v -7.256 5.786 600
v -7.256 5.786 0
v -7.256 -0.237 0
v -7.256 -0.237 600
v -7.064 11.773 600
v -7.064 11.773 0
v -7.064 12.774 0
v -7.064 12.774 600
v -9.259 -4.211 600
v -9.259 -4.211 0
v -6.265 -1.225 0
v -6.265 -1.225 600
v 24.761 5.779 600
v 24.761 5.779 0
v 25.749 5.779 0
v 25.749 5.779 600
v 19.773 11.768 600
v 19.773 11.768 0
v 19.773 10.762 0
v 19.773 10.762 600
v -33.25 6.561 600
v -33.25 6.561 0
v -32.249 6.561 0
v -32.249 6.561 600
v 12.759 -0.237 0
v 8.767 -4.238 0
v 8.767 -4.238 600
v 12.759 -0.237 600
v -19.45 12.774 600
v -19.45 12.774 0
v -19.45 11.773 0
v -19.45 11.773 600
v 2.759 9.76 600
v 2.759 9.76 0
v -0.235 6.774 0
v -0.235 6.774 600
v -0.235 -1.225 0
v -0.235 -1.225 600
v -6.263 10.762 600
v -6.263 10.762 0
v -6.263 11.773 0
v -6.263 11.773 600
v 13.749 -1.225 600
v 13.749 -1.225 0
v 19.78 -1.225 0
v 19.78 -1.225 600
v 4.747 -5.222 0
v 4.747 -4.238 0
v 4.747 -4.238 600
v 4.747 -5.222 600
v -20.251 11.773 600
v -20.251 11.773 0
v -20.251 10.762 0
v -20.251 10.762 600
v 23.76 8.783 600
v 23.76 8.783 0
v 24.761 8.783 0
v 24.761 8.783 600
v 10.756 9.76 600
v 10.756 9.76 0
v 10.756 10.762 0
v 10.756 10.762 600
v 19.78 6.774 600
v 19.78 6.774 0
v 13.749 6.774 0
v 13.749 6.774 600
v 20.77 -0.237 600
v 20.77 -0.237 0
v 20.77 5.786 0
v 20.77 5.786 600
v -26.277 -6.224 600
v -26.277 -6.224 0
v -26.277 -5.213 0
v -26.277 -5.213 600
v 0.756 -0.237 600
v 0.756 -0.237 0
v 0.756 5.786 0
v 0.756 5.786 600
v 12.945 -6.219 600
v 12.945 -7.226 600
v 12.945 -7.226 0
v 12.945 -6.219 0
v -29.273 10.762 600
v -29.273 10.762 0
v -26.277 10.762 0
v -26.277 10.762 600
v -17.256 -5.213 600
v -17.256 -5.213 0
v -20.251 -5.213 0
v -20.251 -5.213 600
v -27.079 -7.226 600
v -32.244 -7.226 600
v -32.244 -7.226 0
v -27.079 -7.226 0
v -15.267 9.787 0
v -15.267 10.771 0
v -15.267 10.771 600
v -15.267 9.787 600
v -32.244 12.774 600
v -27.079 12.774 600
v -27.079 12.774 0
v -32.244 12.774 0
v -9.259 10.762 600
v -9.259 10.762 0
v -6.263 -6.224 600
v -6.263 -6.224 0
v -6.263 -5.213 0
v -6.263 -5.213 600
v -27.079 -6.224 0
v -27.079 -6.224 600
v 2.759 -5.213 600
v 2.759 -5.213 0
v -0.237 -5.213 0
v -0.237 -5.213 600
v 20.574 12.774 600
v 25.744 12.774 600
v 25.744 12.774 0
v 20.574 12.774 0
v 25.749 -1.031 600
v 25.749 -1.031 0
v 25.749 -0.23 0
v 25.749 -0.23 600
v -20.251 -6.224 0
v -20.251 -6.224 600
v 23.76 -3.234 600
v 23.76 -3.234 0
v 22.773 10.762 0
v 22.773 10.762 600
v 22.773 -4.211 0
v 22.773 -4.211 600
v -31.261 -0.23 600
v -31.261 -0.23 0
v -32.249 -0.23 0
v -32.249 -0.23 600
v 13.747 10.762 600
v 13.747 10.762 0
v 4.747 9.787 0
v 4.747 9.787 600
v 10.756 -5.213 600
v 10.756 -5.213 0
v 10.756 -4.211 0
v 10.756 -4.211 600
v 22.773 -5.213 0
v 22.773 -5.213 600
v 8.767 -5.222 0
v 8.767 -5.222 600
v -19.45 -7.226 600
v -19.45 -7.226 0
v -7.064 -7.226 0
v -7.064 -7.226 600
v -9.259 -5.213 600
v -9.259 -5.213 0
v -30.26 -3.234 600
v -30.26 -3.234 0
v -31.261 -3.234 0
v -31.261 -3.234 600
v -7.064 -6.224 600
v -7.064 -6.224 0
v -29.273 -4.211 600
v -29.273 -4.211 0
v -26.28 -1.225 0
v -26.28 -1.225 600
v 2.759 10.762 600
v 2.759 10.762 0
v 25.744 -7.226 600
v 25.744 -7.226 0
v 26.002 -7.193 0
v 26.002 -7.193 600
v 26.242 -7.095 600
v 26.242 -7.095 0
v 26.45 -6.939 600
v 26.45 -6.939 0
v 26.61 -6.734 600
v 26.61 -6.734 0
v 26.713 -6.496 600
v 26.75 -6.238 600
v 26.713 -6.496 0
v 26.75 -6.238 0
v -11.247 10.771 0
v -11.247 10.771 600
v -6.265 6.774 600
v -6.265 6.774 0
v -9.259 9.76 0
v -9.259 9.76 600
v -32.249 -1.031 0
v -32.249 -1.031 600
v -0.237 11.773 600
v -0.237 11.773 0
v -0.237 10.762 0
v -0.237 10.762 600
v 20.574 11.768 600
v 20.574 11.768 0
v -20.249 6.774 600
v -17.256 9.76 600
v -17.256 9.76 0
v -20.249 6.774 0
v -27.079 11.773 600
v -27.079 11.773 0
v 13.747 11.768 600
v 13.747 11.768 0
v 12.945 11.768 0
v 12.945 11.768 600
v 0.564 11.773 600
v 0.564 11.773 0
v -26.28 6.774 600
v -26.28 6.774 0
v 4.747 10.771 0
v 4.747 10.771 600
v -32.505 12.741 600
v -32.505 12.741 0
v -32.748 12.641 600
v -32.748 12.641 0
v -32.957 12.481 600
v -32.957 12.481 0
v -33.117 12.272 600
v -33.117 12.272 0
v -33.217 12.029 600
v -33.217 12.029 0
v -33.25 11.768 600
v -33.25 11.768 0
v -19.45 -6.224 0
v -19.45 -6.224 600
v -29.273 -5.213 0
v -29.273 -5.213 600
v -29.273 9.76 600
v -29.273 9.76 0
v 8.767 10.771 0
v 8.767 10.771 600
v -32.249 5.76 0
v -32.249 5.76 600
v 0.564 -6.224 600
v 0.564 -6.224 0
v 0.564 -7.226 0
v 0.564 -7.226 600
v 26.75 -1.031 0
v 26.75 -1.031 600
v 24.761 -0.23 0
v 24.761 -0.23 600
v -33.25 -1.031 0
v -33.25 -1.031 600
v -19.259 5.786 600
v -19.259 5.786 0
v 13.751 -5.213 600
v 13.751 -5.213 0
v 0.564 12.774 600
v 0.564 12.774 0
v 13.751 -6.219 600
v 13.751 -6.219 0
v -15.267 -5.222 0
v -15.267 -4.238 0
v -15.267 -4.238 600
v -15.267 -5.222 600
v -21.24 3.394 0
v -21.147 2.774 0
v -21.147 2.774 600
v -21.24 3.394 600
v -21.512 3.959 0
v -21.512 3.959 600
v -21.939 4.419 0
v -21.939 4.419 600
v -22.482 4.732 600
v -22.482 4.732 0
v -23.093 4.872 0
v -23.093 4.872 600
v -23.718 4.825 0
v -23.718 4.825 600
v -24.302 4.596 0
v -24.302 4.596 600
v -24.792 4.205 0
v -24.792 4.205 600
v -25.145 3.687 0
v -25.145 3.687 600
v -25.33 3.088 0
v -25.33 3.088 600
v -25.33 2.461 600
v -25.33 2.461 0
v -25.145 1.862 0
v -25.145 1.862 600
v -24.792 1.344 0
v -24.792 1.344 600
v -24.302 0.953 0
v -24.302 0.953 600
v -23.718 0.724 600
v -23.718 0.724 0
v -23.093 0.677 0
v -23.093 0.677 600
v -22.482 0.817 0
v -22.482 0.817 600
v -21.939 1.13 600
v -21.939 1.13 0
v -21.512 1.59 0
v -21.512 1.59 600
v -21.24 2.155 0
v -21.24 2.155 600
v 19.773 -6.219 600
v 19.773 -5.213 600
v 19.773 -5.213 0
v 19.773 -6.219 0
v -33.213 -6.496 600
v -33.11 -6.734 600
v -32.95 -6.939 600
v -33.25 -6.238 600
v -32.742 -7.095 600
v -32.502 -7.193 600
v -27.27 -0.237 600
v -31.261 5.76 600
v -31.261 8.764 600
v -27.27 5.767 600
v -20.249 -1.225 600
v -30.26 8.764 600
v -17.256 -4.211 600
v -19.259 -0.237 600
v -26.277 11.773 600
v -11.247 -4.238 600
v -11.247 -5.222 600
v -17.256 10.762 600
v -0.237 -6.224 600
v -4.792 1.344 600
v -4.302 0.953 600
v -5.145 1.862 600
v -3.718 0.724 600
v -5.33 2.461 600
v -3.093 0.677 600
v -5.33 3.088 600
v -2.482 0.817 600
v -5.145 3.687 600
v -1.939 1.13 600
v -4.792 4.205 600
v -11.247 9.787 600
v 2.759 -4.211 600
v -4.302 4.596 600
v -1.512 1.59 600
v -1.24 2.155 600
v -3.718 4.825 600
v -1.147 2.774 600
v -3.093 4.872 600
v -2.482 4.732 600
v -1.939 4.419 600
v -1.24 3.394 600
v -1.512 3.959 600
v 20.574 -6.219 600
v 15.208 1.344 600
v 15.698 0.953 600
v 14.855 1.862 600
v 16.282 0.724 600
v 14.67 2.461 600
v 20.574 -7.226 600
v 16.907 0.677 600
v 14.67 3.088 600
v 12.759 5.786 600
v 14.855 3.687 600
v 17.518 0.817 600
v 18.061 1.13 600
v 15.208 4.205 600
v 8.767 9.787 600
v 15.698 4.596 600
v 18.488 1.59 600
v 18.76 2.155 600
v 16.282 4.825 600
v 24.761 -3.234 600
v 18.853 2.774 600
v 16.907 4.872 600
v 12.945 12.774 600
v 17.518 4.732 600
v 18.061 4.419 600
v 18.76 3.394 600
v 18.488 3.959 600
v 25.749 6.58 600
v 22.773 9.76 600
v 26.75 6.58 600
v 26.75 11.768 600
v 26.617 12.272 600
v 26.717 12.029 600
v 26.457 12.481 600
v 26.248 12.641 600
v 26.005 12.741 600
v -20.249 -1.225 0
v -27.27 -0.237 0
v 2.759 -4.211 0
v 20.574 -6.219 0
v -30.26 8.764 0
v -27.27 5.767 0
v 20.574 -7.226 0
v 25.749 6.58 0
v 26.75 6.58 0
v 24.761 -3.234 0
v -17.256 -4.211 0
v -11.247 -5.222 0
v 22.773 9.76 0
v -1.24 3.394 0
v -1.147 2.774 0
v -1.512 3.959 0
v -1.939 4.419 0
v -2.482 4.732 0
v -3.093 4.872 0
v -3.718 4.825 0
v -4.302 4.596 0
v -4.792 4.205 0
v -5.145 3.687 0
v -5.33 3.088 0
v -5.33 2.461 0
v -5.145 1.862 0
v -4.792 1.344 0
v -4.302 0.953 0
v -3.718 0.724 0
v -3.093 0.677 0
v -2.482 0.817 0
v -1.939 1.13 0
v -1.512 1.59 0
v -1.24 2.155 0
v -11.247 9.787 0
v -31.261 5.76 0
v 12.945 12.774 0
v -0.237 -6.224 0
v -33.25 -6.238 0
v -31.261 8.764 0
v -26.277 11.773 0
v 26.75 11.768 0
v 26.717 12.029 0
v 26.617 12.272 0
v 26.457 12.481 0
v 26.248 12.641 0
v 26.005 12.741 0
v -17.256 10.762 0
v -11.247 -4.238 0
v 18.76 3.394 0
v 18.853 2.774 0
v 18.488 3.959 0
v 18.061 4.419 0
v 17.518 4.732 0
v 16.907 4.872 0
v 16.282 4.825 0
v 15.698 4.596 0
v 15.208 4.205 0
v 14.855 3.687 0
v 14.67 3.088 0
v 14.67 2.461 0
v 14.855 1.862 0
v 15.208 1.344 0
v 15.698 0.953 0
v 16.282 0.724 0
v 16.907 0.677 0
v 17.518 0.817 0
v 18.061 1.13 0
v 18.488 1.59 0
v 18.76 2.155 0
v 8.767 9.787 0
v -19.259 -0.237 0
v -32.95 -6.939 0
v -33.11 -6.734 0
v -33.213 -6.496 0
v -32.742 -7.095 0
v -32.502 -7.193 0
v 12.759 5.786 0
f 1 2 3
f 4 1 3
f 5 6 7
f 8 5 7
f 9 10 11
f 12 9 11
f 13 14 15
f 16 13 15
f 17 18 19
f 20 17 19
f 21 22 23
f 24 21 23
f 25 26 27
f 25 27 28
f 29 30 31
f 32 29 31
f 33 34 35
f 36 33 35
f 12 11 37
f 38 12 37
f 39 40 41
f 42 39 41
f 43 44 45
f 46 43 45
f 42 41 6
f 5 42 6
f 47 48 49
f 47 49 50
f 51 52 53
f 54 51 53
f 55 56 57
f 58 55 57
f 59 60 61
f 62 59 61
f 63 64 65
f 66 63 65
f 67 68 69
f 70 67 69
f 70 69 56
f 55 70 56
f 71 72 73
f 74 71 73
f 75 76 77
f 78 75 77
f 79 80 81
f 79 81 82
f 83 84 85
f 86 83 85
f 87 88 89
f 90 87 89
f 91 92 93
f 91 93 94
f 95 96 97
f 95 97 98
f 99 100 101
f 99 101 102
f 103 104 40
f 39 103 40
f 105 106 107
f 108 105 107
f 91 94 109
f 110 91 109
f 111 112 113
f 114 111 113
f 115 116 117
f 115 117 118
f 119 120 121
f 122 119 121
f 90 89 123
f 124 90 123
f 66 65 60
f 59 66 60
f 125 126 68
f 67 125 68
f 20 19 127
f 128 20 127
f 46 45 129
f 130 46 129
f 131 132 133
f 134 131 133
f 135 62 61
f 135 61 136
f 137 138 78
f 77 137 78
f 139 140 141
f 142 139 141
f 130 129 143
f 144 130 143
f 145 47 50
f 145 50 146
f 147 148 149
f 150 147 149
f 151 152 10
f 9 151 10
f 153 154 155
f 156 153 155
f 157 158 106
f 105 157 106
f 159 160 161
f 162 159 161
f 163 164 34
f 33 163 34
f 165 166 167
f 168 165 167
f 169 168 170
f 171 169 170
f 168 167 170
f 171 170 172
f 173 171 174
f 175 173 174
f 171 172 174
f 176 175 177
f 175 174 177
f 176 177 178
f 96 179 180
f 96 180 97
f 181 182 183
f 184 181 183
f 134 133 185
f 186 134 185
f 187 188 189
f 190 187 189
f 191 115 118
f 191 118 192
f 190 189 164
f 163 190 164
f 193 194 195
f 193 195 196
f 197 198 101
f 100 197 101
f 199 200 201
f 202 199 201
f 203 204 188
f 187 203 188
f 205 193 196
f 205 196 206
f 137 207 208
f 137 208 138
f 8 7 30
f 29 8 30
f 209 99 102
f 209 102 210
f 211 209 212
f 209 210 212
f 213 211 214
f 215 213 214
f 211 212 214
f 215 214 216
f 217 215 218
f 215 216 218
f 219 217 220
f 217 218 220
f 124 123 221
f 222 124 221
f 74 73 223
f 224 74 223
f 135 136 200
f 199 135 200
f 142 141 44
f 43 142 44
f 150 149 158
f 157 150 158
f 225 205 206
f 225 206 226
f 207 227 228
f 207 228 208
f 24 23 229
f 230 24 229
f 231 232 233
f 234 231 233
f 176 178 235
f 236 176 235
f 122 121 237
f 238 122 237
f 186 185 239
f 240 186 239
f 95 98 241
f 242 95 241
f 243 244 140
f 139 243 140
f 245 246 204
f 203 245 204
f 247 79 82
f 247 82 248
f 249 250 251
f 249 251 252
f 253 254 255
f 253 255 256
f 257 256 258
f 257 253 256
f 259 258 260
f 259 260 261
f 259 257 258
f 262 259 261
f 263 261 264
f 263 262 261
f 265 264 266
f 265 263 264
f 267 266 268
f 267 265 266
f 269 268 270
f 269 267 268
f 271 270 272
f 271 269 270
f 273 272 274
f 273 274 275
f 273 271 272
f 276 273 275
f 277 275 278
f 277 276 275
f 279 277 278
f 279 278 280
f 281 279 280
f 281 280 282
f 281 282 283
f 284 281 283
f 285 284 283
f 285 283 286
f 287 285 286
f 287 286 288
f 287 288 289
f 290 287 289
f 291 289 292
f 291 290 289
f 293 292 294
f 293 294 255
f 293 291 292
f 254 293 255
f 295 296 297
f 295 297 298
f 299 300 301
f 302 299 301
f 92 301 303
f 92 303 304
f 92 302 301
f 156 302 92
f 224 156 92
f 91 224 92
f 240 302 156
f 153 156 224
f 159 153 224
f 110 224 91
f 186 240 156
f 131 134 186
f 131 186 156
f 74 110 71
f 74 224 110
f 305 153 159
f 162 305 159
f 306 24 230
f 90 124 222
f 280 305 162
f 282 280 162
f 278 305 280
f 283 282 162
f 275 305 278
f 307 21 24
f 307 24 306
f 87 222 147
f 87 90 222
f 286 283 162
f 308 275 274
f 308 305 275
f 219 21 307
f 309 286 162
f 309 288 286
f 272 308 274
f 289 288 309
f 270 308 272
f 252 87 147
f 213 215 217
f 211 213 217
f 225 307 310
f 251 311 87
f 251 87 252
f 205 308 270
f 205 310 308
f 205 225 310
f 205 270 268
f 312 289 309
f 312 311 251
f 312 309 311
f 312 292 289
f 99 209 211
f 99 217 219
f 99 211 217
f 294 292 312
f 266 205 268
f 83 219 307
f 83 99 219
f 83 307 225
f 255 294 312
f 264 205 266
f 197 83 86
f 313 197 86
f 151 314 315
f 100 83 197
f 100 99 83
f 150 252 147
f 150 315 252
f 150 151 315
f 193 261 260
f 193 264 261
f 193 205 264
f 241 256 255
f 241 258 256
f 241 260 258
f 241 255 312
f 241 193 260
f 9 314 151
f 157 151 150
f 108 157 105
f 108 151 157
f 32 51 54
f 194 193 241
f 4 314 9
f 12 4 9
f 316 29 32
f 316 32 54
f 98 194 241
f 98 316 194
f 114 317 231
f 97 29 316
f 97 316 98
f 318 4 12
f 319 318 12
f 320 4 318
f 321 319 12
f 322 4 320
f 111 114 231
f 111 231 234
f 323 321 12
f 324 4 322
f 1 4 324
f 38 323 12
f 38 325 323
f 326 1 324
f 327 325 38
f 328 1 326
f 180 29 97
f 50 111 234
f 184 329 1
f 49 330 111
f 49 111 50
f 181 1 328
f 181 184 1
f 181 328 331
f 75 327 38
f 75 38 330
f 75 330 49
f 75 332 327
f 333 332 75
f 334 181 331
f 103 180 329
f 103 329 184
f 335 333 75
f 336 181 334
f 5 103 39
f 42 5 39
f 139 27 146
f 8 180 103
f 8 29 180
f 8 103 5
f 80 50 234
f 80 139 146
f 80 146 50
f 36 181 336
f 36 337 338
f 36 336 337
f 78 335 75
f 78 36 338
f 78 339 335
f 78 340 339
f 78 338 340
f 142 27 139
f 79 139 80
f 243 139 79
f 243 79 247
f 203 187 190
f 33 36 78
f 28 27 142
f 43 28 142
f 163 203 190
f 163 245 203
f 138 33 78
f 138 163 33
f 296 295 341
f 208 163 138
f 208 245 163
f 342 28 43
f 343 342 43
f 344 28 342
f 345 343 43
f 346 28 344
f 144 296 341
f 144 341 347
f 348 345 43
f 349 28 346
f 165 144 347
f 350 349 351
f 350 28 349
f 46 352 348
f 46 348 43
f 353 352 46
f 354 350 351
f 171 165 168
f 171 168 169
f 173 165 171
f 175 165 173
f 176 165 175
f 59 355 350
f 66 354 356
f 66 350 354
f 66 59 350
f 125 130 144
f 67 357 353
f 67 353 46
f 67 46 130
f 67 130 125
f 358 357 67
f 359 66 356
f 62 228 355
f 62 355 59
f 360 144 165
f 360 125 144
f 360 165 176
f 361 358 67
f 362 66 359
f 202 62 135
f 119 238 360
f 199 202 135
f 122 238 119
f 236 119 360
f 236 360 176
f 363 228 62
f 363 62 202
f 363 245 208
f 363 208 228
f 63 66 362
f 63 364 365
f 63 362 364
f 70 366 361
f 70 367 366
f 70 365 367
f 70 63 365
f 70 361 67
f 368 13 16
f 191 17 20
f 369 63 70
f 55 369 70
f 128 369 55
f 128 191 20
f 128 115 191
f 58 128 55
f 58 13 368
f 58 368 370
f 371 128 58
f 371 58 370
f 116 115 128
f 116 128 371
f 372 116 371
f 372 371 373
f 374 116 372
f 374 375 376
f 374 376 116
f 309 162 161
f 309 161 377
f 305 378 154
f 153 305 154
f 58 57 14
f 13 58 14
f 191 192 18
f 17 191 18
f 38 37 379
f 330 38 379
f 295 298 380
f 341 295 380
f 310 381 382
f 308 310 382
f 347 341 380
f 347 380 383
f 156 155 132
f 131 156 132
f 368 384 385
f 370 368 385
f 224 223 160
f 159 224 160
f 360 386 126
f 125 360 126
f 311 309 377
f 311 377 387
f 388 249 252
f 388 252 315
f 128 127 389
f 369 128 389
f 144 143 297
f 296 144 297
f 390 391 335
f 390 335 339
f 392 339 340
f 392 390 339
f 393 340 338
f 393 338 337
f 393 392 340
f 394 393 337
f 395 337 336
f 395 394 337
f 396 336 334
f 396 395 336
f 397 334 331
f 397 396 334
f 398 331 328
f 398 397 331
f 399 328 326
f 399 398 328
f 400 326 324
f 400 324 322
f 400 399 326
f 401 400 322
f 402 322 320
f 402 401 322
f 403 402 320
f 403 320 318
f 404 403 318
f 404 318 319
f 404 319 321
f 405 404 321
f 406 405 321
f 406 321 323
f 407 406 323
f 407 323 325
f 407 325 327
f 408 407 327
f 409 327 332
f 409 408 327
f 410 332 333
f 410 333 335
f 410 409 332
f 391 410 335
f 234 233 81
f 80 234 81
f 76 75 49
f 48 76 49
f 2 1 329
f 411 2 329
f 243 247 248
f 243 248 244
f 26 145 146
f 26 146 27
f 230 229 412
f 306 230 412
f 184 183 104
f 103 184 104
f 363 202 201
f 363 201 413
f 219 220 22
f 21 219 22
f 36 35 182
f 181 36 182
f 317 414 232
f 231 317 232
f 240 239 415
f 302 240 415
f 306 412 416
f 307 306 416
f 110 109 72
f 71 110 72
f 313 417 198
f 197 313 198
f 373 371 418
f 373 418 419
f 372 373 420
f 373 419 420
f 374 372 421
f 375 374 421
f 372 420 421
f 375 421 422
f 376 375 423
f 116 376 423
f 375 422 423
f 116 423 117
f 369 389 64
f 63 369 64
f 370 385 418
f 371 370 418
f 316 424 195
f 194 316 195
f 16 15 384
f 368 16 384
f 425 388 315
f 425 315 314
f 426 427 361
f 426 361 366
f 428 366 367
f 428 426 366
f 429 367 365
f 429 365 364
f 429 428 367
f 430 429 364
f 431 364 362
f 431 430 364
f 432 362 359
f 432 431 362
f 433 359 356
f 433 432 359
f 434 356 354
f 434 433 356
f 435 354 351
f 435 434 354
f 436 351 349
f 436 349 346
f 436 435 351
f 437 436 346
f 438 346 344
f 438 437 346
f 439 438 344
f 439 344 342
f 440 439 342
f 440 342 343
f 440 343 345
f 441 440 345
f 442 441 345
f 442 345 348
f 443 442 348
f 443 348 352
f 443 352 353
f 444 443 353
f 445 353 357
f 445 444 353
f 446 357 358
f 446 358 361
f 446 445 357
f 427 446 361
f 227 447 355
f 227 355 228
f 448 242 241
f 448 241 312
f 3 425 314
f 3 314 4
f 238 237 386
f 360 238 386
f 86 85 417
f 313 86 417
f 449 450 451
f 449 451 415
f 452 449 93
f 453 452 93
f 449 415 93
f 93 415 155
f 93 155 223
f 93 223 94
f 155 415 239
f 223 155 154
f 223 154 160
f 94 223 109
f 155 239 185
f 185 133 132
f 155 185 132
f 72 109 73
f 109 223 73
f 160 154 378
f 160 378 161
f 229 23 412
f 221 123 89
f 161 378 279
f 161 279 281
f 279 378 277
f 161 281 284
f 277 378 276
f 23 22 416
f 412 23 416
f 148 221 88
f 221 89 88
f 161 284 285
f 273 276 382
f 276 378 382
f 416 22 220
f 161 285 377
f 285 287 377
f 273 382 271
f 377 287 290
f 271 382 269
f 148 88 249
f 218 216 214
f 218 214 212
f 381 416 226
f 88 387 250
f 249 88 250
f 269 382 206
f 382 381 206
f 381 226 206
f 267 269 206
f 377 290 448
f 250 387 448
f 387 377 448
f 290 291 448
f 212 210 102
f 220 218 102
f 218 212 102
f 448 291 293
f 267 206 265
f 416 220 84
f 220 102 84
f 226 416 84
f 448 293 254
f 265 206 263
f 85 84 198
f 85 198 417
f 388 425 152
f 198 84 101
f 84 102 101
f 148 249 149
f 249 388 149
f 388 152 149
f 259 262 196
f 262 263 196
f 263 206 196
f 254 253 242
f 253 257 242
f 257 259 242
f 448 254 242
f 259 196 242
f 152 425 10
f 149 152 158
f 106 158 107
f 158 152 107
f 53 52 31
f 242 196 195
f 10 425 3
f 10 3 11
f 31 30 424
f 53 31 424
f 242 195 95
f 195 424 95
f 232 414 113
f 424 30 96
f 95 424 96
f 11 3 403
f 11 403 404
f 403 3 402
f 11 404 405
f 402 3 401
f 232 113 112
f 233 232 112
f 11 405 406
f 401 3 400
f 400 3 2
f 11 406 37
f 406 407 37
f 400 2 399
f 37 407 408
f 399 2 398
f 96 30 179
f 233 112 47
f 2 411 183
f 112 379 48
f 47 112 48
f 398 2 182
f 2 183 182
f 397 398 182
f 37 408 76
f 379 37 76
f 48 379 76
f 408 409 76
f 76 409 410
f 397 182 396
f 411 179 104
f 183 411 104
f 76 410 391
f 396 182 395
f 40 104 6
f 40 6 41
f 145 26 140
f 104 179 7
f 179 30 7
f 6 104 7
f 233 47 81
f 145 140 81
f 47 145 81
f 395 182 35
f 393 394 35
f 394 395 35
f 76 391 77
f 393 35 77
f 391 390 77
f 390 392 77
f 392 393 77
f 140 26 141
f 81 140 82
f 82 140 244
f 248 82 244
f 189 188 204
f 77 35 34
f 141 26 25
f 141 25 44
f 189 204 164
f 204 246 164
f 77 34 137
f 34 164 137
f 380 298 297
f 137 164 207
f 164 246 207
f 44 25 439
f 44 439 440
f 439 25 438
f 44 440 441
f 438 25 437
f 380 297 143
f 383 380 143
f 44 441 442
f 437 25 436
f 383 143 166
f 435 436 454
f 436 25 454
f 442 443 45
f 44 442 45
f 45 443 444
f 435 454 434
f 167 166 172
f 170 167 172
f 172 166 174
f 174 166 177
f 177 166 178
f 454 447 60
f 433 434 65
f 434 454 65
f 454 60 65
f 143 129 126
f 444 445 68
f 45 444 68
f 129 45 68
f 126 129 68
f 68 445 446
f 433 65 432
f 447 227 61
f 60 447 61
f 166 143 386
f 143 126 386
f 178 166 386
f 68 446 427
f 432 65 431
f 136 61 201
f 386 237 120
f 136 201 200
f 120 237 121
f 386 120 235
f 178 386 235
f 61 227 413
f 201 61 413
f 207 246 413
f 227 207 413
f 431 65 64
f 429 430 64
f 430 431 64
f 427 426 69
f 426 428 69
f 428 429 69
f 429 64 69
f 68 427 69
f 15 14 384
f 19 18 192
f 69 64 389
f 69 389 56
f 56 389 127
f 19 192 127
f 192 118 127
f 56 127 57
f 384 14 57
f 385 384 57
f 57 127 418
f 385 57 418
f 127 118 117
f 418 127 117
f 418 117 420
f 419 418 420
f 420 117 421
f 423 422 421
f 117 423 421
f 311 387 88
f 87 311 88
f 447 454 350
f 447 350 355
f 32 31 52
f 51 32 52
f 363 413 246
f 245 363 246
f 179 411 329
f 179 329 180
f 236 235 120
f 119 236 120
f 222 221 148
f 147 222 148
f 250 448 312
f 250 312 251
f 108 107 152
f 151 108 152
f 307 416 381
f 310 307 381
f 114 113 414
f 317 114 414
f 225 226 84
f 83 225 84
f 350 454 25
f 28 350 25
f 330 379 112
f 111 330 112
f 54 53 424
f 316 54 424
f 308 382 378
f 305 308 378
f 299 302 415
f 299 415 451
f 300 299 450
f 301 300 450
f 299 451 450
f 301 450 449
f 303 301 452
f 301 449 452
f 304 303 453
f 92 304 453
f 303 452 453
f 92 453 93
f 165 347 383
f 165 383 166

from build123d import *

# Parameters (mm, degrees)
SKETCH_1_R      = 2.103037388
EXTRUDE_1_DEPTH = 600


with BuildPart() as part:
    # 草图1 → 凸台-拉伸1 (new body)
    with BuildSketch(Plane.XY):
        with BuildLine():
            Line((-32.248557314, -0.229845073), (-32.248557314, -1.030984477))
            Line((-32.248557314, -1.030984477), (-33.250003689, -1.030984477))
            Line((-33.250003689, -1.030984477), (-33.250003689, -6.238394755))
            ThreePointArc((-33.250003689, -6.238394755), (-32.949991565, -6.938952391), (-32.24382973, -7.225524788))
            Line((-32.24382973, -7.225524788), (-27.078556151, -7.225524788))
            Line((-27.078556151, -7.225524788), (-27.078556151, -6.224078413))
            Line((-27.078556151, -6.224078413), (-26.277399051, -6.224078413))
            Line((-26.277399051, -6.224078413), (-26.277399051, -5.212715786))
            Line((-26.277399051, -5.212715786), (-29.27300496, -5.212715786))
            Line((-29.27300496, -5.212715786), (-29.27300496, -4.211495229))
            Line((-29.27300496, -4.211495229), (-26.279632969, -1.225390538))
            Line((-26.279632969, -1.225390538), (-20.24902045, -1.225390538))
            Line((-20.24902045, -1.225390538), (-17.255648459, -4.211495229))
            Line((-17.255648459, -4.211495229), (-17.255648459, -5.212715786))
            Line((-17.255648459, -5.212715786), (-20.251254368, -5.212715786))
            Line((-20.251254368, -5.212715786), (-20.251254368, -6.224078413))
            Line((-20.251254368, -6.224078413), (-19.450097268, -6.224078413))
            Line((-19.450097268, -6.224078413), (-19.450097268, -7.225524788))
            Line((-19.450097268, -7.225524788), (-7.064233131, -7.225524788))
            Line((-7.064233131, -7.225524788), (-7.064233131, -6.224078413))
            Line((-7.064233131, -6.224078413), (-6.263076031, -6.224078413))
            Line((-6.263076031, -6.224078413), (-6.263076031, -5.212715786))
            Line((-6.263076031, -5.212715786), (-9.25868194, -5.212715786))
            Line((-9.25868194, -5.212715786), (-9.25868194, -4.211495229))
            Line((-9.25868194, -4.211495229), (-6.265309949, -1.225390538))
            Line((-6.265309949, -1.225390538), (-0.234697429, -1.225390538))
            Line((-0.234697429, -1.225390538), (2.758674561, -4.211495229))
            Line((2.758674561, -4.211495229), (2.758674561, -5.212715786))
            Line((2.758674561, -5.212715786), (-0.236931348, -5.212715786))
            Line((-0.236931348, -5.212715786), (-0.236931348, -6.224078413))
            Line((-0.236931348, -6.224078413), (0.564225752, -6.224078413))
            Line((0.564225752, -6.224078413), (0.564225752, -7.225524788))
            Line((0.564225752, -7.225524788), (12.945482254, -7.225524788))
            Line((12.945482254, -7.225524788), (12.945482254, -6.219120287))
            Line((12.945482254, -6.219120287), (13.751246989, -6.219120287))
            Line((13.751246989, -6.219120287), (13.751246989, -5.212715786))
            Line((13.751246989, -5.212715786), (10.755641081, -5.212715786))
            Line((10.755641081, -5.212715786), (10.755641081, -4.211495229))
            Line((10.755641081, -4.211495229), (13.749013071, -1.225390538))
            Line((13.749013071, -1.225390538), (19.779625591, -1.225390538))
            Line((19.779625591, -1.225390538), (22.772997581, -4.211495229))
            Line((22.772997581, -4.211495229), (22.772997581, -5.212715786))
            Line((22.772997581, -5.212715786), (19.772784037, -5.212715786))
            Line((19.772784037, -5.212715786), (19.772784037, -6.219120287))
            Line((19.772784037, -6.219120287), (20.573941137, -6.219120287))
            Line((20.573941137, -6.219120287), (20.573941137, -7.225524788))
            Line((20.573941137, -7.225524788), (25.743822351, -7.225524788))
            ThreePointArc((25.743822351, -7.225524788), (26.449984187, -6.938952391), (26.749996311, -6.238394755))
            Line((26.749996311, -6.238394755), (26.749996311, -1.030984477))
            Line((26.749996311, -1.030984477), (25.748549936, -1.030984477))
            Line((25.748549936, -1.030984477), (25.748549936, -0.229827377))
            Line((25.748549936, -0.229827377), (24.761302481, -0.229827377))
            Line((24.761302481, -0.229827377), (24.761302481, -3.234203038))
            Line((24.761302481, -3.234203038), (23.759856106, -3.234203038))
            Line((23.759856106, -3.234203038), (20.770104831, -0.237175589))
            Line((20.770104831, -0.237175589), (20.770104831, 5.786126014))
            Line((20.770104831, 5.786126014), (23.759856106, 8.783153462))
            Line((23.759856106, 8.783153462), (24.761302481, 8.783153462))
            Line((24.761302481, 8.783153462), (24.761302481, 5.778777801))
            Line((24.761302481, 5.778777801), (25.748549936, 5.778777801))
            Line((25.748549936, 5.778777801), (25.748549936, 6.579934901))
            Line((25.748549936, 6.579934901), (26.749996311, 6.579934901))
            Line((26.749996311, 6.579934901), (26.749996311, 11.768212512))
            ThreePointArc((26.749996311, 11.768212512), (26.456722319, 12.481138347), (25.743822351, 12.774475212))
            Line((25.743822351, 12.774475212), (20.573941137, 12.774475212))
            Line((20.573941137, 12.774475212), (20.573941137, 11.768070711))
            Line((20.573941137, 11.768070711), (19.772784037, 11.768070711))
            Line((19.772784037, 11.768070711), (19.772784037, 10.761666211))
            Line((19.772784037, 10.761666211), (22.772997581, 10.761666211))
            Line((22.772997581, 10.761666211), (22.772997581, 9.760445653))
            Line((22.772997581, 9.760445653), (19.779625591, 6.774340962))
            Line((19.779625591, 6.774340962), (13.749013071, 6.774340962))
            Line((13.749013071, 6.774340962), (10.755641081, 9.760445653))
            Line((10.755641081, 9.760445653), (10.755641081, 10.761666211))
            Line((10.755641081, 10.761666211), (13.746639354, 10.761666211))
            Line((13.746639354, 10.761666211), (13.746639354, 11.768070711))
            Line((13.746639354, 11.768070711), (12.945482254, 11.768070711))
            Line((12.945482254, 11.768070711), (12.945482254, 12.774475212))
            Line((12.945482254, 12.774475212), (0.564225752, 12.774475212))
            Line((0.564225752, 12.774475212), (0.564225752, 11.773028837))
            Line((0.564225752, 11.773028837), (-0.236931348, 11.773028837))
            Line((-0.236931348, 11.773028837), (-0.236931348, 10.761666211))
            Line((-0.236931348, 10.761666211), (2.758674561, 10.761666211))
            Line((2.758674561, 10.761666211), (2.758674561, 9.760445653))
            Line((2.758674561, 9.760445653), (-0.234697429, 6.774340962))
            Line((-0.234697429, 6.774340962), (-6.265309949, 6.774340962))
            Line((-6.265309949, 6.774340962), (-9.25868194, 9.760445653))
            Line((-9.25868194, 9.760445653), (-9.25868194, 10.761666211))
            Line((-9.25868194, 10.761666211), (-6.263076031, 10.761666211))
            Line((-6.263076031, 10.761666211), (-6.263076031, 11.773028837))
            Line((-6.263076031, 11.773028837), (-7.064233131, 11.773028837))
            Line((-7.064233131, 11.773028837), (-7.064233131, 12.774475212))
            Line((-7.064233131, 12.774475212), (-19.450097268, 12.774475212))
            Line((-19.450097268, 12.774475212), (-19.450097268, 11.773028837))
            Line((-19.450097268, 11.773028837), (-20.251254368, 11.773028837))
            Line((-20.251254368, 11.773028837), (-20.251254368, 10.761666211))
            Line((-20.251254368, 10.761666211), (-17.255648459, 10.761666211))
            Line((-17.255648459, 10.761666211), (-17.255648459, 9.760445653))
            Line((-17.255648459, 9.760445653), (-20.24902045, 6.774340962))
            Line((-20.24902045, 6.774340962), (-26.279632969, 6.774340962))
            Line((-26.279632969, 6.774340962), (-29.27300496, 9.760445653))
            Line((-29.27300496, 9.760445653), (-29.27300496, 10.761666211))
            Line((-29.27300496, 10.761666211), (-26.277399051, 10.761666211))
            Line((-26.277399051, 10.761666211), (-26.277399051, 11.773028837))
            Line((-26.277399051, 11.773028837), (-27.078556151, 11.773028837))
            Line((-27.078556151, 11.773028837), (-27.078556151, 12.774475212))
            Line((-27.078556151, 12.774475212), (-32.24382973, 12.774475212))
            ThreePointArc((-32.24382973, 12.774475212), (-32.956729698, 12.481138347), (-33.250003689, 11.768212512))
            Line((-33.250003689, 11.768212512), (-33.250003689, 6.560802234))
            Line((-33.250003689, 6.560802234), (-32.248557314, 6.560802234))
            Line((-32.248557314, 6.560802234), (-32.248557314, 5.759645134))
            Line((-32.248557314, 5.759645134), (-31.261309859, 5.759645134))
            Line((-31.261309859, 5.759645134), (-31.261309859, 8.764020795))
            Line((-31.261309859, 8.764020795), (-30.259863484, 8.764020795))
            Line((-30.259863484, 8.764020795), (-27.27011221, 5.766993347))
            Line((-27.27011221, 5.766993347), (-27.27011221, -0.237175589))
            Line((-27.27011221, -0.237175589), (-30.259863484, -3.234203038))
            Line((-30.259863484, -3.234203038), (-31.261309859, -3.234203038))
            Line((-31.261309859, -3.234203038), (-31.261309859, -0.229845073))
            Line((-31.261309859, -0.229845073), (-32.248557314, -0.229845073))
        make_face()
        with Locations((-3.250003689, 2.774475212)):
            Circle(SKETCH_1_R, mode=Mode.SUBTRACT)
        with Locations((-23.250003689, 2.774475212)):
            Circle(SKETCH_1_R, mode=Mode.SUBTRACT)
        with Locations((16.749996311, 2.774475212)):
            Circle(SKETCH_1_R, mode=Mode.SUBTRACT)
        Polygon((-19.258541209, 5.786126014), (-19.258541209, -0.237175589), (-15.26734356, -4.238086639), (-15.26734356, -5.22228212), (-11.246986839, -5.22228212), (-11.246986839, -4.238086639), (-7.25578919, -0.237175589), (-7.25578919, 2.774475212), (-7.25578919, 5.786126014), (-11.246986839, 9.787037063), (-11.246986839, 10.771232544), (-15.26734356, 10.771232544), (-15.26734356, 9.787037063), align=None, mode=Mode.SUBTRACT)
        Polygon((4.74697946, -5.22228212), (8.767336181, -5.22228212), (8.767336181, -4.238086639), (12.758533831, -0.237175589), (12.758533831, 2.774475212), (12.758533831, 5.786126014), (8.767336181, 9.787037063), (8.767336181, 10.771232544), (4.74697946, 10.771232544), (4.74697946, 9.787037063), (0.755781811, 5.786126014), (0.755781811, 2.774475212), (0.755781811, -0.237175589), (4.74697946, -4.238086639), align=None, mode=Mode.SUBTRACT)
    extrude(amount=EXTRUDE_1_DEPTH)


solid = part.part
